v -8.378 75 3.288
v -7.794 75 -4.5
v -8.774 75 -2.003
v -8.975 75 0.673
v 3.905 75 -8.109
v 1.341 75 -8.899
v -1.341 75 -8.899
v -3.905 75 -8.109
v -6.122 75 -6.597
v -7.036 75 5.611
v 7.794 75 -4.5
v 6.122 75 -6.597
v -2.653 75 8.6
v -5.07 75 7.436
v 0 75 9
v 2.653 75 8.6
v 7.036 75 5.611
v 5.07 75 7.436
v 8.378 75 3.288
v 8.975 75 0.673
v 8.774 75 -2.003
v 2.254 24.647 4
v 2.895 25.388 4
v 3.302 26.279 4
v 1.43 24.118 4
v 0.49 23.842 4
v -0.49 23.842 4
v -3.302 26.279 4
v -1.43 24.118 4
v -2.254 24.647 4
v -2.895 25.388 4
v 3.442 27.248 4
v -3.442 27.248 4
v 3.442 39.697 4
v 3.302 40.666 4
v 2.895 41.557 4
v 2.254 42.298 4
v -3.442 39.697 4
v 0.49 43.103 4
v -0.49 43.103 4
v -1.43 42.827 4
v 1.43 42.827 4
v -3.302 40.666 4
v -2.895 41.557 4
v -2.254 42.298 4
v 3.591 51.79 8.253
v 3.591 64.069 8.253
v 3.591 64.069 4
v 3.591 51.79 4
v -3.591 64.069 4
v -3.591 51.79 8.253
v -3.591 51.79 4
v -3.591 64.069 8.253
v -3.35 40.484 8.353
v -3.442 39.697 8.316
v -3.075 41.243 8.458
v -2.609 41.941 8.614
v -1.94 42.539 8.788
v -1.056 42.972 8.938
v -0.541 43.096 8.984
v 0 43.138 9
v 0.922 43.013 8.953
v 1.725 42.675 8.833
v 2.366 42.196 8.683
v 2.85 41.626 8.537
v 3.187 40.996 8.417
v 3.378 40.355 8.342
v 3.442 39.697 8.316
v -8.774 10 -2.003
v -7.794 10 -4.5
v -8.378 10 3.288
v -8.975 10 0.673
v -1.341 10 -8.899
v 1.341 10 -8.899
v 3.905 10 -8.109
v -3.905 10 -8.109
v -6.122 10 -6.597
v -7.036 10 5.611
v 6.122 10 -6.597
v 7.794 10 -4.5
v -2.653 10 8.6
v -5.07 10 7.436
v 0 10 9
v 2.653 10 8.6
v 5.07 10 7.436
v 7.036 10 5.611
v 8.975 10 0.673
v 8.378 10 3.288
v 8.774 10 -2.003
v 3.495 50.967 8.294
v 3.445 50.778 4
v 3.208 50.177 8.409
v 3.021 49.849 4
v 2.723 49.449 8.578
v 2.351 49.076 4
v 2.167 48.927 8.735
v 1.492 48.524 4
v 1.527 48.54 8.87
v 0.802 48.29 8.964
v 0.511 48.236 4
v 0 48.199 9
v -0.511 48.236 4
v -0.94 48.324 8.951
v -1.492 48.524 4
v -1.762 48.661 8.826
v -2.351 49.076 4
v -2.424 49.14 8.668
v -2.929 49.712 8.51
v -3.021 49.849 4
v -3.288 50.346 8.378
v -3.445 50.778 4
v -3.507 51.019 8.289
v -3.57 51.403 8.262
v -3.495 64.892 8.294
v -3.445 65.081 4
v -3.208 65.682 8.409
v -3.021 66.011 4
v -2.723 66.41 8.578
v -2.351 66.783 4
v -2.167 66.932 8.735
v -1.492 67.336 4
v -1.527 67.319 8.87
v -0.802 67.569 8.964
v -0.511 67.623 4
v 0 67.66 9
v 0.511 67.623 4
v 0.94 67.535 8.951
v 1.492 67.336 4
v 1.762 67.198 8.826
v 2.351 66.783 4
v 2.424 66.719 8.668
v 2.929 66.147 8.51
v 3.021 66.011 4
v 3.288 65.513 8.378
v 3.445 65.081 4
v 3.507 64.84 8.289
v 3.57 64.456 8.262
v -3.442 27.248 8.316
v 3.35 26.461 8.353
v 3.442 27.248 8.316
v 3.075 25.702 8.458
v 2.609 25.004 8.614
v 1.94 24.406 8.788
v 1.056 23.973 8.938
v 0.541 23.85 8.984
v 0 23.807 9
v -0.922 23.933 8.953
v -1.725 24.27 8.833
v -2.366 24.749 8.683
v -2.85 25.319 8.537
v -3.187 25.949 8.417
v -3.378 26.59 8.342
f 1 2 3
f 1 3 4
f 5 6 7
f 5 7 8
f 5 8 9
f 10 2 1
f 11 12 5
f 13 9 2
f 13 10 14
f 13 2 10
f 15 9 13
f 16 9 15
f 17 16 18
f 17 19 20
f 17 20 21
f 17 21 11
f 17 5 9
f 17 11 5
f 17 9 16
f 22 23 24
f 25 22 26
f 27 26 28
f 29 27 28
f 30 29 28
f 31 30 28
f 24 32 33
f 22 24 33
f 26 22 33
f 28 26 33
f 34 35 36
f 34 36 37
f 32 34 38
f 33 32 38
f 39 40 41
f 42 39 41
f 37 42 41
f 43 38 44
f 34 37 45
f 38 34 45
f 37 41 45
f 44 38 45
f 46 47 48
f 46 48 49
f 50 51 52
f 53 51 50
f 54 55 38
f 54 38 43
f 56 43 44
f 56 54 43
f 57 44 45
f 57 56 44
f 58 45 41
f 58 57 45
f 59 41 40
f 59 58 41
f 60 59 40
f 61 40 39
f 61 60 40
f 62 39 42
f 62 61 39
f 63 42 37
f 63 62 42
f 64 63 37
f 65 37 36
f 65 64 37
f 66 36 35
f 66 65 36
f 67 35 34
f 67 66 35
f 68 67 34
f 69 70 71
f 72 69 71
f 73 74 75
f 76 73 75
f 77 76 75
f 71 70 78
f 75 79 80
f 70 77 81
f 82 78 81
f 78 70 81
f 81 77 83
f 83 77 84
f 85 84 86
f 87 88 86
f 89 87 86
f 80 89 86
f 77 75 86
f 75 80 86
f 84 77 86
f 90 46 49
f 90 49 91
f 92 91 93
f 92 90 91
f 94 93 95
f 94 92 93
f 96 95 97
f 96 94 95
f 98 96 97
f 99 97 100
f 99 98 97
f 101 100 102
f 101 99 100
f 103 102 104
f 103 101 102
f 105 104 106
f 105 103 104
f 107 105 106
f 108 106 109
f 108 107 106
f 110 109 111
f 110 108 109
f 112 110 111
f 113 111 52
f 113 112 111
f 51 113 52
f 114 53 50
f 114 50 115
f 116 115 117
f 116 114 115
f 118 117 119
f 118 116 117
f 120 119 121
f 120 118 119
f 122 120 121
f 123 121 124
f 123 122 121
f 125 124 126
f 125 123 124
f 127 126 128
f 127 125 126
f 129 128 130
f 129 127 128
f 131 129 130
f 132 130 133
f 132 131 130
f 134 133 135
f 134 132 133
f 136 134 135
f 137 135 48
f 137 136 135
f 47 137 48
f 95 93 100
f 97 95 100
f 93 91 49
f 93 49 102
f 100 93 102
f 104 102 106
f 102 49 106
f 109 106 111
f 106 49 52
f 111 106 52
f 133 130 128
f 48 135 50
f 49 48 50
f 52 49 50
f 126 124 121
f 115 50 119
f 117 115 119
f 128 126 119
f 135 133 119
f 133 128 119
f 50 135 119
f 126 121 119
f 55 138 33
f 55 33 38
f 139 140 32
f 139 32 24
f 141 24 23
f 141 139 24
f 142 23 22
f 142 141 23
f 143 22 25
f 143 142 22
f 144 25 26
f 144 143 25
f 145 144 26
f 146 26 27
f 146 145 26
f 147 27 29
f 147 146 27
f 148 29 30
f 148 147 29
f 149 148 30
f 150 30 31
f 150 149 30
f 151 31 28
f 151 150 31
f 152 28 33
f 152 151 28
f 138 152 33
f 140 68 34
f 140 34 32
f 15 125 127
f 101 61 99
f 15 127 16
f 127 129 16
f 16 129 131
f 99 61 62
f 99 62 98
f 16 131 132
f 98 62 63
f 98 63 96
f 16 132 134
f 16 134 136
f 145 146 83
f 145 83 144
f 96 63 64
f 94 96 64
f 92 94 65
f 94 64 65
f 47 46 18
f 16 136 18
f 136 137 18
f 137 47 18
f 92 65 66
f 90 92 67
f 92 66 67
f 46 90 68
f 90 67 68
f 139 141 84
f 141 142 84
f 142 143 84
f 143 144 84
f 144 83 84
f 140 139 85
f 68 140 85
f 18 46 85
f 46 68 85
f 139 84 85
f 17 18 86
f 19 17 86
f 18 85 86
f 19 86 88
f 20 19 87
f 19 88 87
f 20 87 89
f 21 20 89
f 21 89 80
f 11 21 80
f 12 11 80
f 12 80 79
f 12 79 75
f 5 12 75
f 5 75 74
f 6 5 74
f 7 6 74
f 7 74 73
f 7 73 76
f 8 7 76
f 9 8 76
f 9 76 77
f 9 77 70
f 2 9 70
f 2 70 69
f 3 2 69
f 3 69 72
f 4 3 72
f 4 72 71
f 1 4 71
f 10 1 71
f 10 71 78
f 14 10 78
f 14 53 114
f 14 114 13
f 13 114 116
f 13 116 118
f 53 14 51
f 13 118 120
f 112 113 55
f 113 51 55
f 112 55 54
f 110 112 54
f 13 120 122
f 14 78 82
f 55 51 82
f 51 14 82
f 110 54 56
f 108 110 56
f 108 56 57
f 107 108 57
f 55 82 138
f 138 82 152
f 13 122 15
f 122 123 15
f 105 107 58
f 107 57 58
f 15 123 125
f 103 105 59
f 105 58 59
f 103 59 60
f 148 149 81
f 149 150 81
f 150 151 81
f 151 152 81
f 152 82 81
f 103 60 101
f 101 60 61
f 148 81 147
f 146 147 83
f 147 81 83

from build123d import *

# Parameters (mm, degrees)
SKETCH_2_R          = 9
EXTRUDE_1_DEPTH     = 65
CUT_EXTRUDE_START   = 9
CUT_EXTRUDE_1_DEPTH = 5
CUT_EXTRUDE_2_DEPTH = 5


with BuildPart() as part:
    # 草图2 → 凸台-拉伸1 (new body)
    with BuildSketch(Plane(origin=(0, 10, 0), x_dir=(1, 0, 0), z_dir=(0, 1, 0))):
        with Locations(Location((0, 0, 0), (0, 0, 270))):
            Circle(SKETCH_2_R)
    extrude(amount=EXTRUDE_1_DEPTH)

    # 草图4 → 切除-拉伸1 (cut)
    with BuildSketch(Plane.XY.offset(CUT_EXTRUDE_START)):
        with BuildLine():
            Line((-3.441616095, 27.248377589), (-3.441616095, 39.696776231))
            ThreePointArc((-3.441616095, 39.696776231), (0, 43.138392326), (3.441616095, 39.696776231))
            Line((3.441616095, 39.696776231), (3.441616095, 27.248377589))
            ThreePointArc((3.441616095, 27.248377589), (0, 23.806761494), (-3.441616095, 27.248377589))
        make_face()
    extrude(amount=-CUT_EXTRUDE_1_DEPTH, mode=Mode.SUBTRACT)

    # 草图5 → 切除-拉伸2 (cut)
    with BuildSketch(Plane.XY.offset(9)):
        with BuildLine():
            Line((-3.590752792, 51.789816315), (-3.590752792, 64.069272059))
            ThreePointArc((-3.590752792, 64.069272059), (0, 67.660024851), (3.590752792, 64.069272059))
            Line((3.590752792, 64.069272059), (3.590752792, 51.789816315))
            ThreePointArc((3.590752792, 51.789816315), (0, 48.199063523), (-3.590752792, 51.789816315))
        make_face()
    extrude(amount=-CUT_EXTRUDE_2_DEPTH, mode=Mode.SUBTRACT)


solid = part.part
